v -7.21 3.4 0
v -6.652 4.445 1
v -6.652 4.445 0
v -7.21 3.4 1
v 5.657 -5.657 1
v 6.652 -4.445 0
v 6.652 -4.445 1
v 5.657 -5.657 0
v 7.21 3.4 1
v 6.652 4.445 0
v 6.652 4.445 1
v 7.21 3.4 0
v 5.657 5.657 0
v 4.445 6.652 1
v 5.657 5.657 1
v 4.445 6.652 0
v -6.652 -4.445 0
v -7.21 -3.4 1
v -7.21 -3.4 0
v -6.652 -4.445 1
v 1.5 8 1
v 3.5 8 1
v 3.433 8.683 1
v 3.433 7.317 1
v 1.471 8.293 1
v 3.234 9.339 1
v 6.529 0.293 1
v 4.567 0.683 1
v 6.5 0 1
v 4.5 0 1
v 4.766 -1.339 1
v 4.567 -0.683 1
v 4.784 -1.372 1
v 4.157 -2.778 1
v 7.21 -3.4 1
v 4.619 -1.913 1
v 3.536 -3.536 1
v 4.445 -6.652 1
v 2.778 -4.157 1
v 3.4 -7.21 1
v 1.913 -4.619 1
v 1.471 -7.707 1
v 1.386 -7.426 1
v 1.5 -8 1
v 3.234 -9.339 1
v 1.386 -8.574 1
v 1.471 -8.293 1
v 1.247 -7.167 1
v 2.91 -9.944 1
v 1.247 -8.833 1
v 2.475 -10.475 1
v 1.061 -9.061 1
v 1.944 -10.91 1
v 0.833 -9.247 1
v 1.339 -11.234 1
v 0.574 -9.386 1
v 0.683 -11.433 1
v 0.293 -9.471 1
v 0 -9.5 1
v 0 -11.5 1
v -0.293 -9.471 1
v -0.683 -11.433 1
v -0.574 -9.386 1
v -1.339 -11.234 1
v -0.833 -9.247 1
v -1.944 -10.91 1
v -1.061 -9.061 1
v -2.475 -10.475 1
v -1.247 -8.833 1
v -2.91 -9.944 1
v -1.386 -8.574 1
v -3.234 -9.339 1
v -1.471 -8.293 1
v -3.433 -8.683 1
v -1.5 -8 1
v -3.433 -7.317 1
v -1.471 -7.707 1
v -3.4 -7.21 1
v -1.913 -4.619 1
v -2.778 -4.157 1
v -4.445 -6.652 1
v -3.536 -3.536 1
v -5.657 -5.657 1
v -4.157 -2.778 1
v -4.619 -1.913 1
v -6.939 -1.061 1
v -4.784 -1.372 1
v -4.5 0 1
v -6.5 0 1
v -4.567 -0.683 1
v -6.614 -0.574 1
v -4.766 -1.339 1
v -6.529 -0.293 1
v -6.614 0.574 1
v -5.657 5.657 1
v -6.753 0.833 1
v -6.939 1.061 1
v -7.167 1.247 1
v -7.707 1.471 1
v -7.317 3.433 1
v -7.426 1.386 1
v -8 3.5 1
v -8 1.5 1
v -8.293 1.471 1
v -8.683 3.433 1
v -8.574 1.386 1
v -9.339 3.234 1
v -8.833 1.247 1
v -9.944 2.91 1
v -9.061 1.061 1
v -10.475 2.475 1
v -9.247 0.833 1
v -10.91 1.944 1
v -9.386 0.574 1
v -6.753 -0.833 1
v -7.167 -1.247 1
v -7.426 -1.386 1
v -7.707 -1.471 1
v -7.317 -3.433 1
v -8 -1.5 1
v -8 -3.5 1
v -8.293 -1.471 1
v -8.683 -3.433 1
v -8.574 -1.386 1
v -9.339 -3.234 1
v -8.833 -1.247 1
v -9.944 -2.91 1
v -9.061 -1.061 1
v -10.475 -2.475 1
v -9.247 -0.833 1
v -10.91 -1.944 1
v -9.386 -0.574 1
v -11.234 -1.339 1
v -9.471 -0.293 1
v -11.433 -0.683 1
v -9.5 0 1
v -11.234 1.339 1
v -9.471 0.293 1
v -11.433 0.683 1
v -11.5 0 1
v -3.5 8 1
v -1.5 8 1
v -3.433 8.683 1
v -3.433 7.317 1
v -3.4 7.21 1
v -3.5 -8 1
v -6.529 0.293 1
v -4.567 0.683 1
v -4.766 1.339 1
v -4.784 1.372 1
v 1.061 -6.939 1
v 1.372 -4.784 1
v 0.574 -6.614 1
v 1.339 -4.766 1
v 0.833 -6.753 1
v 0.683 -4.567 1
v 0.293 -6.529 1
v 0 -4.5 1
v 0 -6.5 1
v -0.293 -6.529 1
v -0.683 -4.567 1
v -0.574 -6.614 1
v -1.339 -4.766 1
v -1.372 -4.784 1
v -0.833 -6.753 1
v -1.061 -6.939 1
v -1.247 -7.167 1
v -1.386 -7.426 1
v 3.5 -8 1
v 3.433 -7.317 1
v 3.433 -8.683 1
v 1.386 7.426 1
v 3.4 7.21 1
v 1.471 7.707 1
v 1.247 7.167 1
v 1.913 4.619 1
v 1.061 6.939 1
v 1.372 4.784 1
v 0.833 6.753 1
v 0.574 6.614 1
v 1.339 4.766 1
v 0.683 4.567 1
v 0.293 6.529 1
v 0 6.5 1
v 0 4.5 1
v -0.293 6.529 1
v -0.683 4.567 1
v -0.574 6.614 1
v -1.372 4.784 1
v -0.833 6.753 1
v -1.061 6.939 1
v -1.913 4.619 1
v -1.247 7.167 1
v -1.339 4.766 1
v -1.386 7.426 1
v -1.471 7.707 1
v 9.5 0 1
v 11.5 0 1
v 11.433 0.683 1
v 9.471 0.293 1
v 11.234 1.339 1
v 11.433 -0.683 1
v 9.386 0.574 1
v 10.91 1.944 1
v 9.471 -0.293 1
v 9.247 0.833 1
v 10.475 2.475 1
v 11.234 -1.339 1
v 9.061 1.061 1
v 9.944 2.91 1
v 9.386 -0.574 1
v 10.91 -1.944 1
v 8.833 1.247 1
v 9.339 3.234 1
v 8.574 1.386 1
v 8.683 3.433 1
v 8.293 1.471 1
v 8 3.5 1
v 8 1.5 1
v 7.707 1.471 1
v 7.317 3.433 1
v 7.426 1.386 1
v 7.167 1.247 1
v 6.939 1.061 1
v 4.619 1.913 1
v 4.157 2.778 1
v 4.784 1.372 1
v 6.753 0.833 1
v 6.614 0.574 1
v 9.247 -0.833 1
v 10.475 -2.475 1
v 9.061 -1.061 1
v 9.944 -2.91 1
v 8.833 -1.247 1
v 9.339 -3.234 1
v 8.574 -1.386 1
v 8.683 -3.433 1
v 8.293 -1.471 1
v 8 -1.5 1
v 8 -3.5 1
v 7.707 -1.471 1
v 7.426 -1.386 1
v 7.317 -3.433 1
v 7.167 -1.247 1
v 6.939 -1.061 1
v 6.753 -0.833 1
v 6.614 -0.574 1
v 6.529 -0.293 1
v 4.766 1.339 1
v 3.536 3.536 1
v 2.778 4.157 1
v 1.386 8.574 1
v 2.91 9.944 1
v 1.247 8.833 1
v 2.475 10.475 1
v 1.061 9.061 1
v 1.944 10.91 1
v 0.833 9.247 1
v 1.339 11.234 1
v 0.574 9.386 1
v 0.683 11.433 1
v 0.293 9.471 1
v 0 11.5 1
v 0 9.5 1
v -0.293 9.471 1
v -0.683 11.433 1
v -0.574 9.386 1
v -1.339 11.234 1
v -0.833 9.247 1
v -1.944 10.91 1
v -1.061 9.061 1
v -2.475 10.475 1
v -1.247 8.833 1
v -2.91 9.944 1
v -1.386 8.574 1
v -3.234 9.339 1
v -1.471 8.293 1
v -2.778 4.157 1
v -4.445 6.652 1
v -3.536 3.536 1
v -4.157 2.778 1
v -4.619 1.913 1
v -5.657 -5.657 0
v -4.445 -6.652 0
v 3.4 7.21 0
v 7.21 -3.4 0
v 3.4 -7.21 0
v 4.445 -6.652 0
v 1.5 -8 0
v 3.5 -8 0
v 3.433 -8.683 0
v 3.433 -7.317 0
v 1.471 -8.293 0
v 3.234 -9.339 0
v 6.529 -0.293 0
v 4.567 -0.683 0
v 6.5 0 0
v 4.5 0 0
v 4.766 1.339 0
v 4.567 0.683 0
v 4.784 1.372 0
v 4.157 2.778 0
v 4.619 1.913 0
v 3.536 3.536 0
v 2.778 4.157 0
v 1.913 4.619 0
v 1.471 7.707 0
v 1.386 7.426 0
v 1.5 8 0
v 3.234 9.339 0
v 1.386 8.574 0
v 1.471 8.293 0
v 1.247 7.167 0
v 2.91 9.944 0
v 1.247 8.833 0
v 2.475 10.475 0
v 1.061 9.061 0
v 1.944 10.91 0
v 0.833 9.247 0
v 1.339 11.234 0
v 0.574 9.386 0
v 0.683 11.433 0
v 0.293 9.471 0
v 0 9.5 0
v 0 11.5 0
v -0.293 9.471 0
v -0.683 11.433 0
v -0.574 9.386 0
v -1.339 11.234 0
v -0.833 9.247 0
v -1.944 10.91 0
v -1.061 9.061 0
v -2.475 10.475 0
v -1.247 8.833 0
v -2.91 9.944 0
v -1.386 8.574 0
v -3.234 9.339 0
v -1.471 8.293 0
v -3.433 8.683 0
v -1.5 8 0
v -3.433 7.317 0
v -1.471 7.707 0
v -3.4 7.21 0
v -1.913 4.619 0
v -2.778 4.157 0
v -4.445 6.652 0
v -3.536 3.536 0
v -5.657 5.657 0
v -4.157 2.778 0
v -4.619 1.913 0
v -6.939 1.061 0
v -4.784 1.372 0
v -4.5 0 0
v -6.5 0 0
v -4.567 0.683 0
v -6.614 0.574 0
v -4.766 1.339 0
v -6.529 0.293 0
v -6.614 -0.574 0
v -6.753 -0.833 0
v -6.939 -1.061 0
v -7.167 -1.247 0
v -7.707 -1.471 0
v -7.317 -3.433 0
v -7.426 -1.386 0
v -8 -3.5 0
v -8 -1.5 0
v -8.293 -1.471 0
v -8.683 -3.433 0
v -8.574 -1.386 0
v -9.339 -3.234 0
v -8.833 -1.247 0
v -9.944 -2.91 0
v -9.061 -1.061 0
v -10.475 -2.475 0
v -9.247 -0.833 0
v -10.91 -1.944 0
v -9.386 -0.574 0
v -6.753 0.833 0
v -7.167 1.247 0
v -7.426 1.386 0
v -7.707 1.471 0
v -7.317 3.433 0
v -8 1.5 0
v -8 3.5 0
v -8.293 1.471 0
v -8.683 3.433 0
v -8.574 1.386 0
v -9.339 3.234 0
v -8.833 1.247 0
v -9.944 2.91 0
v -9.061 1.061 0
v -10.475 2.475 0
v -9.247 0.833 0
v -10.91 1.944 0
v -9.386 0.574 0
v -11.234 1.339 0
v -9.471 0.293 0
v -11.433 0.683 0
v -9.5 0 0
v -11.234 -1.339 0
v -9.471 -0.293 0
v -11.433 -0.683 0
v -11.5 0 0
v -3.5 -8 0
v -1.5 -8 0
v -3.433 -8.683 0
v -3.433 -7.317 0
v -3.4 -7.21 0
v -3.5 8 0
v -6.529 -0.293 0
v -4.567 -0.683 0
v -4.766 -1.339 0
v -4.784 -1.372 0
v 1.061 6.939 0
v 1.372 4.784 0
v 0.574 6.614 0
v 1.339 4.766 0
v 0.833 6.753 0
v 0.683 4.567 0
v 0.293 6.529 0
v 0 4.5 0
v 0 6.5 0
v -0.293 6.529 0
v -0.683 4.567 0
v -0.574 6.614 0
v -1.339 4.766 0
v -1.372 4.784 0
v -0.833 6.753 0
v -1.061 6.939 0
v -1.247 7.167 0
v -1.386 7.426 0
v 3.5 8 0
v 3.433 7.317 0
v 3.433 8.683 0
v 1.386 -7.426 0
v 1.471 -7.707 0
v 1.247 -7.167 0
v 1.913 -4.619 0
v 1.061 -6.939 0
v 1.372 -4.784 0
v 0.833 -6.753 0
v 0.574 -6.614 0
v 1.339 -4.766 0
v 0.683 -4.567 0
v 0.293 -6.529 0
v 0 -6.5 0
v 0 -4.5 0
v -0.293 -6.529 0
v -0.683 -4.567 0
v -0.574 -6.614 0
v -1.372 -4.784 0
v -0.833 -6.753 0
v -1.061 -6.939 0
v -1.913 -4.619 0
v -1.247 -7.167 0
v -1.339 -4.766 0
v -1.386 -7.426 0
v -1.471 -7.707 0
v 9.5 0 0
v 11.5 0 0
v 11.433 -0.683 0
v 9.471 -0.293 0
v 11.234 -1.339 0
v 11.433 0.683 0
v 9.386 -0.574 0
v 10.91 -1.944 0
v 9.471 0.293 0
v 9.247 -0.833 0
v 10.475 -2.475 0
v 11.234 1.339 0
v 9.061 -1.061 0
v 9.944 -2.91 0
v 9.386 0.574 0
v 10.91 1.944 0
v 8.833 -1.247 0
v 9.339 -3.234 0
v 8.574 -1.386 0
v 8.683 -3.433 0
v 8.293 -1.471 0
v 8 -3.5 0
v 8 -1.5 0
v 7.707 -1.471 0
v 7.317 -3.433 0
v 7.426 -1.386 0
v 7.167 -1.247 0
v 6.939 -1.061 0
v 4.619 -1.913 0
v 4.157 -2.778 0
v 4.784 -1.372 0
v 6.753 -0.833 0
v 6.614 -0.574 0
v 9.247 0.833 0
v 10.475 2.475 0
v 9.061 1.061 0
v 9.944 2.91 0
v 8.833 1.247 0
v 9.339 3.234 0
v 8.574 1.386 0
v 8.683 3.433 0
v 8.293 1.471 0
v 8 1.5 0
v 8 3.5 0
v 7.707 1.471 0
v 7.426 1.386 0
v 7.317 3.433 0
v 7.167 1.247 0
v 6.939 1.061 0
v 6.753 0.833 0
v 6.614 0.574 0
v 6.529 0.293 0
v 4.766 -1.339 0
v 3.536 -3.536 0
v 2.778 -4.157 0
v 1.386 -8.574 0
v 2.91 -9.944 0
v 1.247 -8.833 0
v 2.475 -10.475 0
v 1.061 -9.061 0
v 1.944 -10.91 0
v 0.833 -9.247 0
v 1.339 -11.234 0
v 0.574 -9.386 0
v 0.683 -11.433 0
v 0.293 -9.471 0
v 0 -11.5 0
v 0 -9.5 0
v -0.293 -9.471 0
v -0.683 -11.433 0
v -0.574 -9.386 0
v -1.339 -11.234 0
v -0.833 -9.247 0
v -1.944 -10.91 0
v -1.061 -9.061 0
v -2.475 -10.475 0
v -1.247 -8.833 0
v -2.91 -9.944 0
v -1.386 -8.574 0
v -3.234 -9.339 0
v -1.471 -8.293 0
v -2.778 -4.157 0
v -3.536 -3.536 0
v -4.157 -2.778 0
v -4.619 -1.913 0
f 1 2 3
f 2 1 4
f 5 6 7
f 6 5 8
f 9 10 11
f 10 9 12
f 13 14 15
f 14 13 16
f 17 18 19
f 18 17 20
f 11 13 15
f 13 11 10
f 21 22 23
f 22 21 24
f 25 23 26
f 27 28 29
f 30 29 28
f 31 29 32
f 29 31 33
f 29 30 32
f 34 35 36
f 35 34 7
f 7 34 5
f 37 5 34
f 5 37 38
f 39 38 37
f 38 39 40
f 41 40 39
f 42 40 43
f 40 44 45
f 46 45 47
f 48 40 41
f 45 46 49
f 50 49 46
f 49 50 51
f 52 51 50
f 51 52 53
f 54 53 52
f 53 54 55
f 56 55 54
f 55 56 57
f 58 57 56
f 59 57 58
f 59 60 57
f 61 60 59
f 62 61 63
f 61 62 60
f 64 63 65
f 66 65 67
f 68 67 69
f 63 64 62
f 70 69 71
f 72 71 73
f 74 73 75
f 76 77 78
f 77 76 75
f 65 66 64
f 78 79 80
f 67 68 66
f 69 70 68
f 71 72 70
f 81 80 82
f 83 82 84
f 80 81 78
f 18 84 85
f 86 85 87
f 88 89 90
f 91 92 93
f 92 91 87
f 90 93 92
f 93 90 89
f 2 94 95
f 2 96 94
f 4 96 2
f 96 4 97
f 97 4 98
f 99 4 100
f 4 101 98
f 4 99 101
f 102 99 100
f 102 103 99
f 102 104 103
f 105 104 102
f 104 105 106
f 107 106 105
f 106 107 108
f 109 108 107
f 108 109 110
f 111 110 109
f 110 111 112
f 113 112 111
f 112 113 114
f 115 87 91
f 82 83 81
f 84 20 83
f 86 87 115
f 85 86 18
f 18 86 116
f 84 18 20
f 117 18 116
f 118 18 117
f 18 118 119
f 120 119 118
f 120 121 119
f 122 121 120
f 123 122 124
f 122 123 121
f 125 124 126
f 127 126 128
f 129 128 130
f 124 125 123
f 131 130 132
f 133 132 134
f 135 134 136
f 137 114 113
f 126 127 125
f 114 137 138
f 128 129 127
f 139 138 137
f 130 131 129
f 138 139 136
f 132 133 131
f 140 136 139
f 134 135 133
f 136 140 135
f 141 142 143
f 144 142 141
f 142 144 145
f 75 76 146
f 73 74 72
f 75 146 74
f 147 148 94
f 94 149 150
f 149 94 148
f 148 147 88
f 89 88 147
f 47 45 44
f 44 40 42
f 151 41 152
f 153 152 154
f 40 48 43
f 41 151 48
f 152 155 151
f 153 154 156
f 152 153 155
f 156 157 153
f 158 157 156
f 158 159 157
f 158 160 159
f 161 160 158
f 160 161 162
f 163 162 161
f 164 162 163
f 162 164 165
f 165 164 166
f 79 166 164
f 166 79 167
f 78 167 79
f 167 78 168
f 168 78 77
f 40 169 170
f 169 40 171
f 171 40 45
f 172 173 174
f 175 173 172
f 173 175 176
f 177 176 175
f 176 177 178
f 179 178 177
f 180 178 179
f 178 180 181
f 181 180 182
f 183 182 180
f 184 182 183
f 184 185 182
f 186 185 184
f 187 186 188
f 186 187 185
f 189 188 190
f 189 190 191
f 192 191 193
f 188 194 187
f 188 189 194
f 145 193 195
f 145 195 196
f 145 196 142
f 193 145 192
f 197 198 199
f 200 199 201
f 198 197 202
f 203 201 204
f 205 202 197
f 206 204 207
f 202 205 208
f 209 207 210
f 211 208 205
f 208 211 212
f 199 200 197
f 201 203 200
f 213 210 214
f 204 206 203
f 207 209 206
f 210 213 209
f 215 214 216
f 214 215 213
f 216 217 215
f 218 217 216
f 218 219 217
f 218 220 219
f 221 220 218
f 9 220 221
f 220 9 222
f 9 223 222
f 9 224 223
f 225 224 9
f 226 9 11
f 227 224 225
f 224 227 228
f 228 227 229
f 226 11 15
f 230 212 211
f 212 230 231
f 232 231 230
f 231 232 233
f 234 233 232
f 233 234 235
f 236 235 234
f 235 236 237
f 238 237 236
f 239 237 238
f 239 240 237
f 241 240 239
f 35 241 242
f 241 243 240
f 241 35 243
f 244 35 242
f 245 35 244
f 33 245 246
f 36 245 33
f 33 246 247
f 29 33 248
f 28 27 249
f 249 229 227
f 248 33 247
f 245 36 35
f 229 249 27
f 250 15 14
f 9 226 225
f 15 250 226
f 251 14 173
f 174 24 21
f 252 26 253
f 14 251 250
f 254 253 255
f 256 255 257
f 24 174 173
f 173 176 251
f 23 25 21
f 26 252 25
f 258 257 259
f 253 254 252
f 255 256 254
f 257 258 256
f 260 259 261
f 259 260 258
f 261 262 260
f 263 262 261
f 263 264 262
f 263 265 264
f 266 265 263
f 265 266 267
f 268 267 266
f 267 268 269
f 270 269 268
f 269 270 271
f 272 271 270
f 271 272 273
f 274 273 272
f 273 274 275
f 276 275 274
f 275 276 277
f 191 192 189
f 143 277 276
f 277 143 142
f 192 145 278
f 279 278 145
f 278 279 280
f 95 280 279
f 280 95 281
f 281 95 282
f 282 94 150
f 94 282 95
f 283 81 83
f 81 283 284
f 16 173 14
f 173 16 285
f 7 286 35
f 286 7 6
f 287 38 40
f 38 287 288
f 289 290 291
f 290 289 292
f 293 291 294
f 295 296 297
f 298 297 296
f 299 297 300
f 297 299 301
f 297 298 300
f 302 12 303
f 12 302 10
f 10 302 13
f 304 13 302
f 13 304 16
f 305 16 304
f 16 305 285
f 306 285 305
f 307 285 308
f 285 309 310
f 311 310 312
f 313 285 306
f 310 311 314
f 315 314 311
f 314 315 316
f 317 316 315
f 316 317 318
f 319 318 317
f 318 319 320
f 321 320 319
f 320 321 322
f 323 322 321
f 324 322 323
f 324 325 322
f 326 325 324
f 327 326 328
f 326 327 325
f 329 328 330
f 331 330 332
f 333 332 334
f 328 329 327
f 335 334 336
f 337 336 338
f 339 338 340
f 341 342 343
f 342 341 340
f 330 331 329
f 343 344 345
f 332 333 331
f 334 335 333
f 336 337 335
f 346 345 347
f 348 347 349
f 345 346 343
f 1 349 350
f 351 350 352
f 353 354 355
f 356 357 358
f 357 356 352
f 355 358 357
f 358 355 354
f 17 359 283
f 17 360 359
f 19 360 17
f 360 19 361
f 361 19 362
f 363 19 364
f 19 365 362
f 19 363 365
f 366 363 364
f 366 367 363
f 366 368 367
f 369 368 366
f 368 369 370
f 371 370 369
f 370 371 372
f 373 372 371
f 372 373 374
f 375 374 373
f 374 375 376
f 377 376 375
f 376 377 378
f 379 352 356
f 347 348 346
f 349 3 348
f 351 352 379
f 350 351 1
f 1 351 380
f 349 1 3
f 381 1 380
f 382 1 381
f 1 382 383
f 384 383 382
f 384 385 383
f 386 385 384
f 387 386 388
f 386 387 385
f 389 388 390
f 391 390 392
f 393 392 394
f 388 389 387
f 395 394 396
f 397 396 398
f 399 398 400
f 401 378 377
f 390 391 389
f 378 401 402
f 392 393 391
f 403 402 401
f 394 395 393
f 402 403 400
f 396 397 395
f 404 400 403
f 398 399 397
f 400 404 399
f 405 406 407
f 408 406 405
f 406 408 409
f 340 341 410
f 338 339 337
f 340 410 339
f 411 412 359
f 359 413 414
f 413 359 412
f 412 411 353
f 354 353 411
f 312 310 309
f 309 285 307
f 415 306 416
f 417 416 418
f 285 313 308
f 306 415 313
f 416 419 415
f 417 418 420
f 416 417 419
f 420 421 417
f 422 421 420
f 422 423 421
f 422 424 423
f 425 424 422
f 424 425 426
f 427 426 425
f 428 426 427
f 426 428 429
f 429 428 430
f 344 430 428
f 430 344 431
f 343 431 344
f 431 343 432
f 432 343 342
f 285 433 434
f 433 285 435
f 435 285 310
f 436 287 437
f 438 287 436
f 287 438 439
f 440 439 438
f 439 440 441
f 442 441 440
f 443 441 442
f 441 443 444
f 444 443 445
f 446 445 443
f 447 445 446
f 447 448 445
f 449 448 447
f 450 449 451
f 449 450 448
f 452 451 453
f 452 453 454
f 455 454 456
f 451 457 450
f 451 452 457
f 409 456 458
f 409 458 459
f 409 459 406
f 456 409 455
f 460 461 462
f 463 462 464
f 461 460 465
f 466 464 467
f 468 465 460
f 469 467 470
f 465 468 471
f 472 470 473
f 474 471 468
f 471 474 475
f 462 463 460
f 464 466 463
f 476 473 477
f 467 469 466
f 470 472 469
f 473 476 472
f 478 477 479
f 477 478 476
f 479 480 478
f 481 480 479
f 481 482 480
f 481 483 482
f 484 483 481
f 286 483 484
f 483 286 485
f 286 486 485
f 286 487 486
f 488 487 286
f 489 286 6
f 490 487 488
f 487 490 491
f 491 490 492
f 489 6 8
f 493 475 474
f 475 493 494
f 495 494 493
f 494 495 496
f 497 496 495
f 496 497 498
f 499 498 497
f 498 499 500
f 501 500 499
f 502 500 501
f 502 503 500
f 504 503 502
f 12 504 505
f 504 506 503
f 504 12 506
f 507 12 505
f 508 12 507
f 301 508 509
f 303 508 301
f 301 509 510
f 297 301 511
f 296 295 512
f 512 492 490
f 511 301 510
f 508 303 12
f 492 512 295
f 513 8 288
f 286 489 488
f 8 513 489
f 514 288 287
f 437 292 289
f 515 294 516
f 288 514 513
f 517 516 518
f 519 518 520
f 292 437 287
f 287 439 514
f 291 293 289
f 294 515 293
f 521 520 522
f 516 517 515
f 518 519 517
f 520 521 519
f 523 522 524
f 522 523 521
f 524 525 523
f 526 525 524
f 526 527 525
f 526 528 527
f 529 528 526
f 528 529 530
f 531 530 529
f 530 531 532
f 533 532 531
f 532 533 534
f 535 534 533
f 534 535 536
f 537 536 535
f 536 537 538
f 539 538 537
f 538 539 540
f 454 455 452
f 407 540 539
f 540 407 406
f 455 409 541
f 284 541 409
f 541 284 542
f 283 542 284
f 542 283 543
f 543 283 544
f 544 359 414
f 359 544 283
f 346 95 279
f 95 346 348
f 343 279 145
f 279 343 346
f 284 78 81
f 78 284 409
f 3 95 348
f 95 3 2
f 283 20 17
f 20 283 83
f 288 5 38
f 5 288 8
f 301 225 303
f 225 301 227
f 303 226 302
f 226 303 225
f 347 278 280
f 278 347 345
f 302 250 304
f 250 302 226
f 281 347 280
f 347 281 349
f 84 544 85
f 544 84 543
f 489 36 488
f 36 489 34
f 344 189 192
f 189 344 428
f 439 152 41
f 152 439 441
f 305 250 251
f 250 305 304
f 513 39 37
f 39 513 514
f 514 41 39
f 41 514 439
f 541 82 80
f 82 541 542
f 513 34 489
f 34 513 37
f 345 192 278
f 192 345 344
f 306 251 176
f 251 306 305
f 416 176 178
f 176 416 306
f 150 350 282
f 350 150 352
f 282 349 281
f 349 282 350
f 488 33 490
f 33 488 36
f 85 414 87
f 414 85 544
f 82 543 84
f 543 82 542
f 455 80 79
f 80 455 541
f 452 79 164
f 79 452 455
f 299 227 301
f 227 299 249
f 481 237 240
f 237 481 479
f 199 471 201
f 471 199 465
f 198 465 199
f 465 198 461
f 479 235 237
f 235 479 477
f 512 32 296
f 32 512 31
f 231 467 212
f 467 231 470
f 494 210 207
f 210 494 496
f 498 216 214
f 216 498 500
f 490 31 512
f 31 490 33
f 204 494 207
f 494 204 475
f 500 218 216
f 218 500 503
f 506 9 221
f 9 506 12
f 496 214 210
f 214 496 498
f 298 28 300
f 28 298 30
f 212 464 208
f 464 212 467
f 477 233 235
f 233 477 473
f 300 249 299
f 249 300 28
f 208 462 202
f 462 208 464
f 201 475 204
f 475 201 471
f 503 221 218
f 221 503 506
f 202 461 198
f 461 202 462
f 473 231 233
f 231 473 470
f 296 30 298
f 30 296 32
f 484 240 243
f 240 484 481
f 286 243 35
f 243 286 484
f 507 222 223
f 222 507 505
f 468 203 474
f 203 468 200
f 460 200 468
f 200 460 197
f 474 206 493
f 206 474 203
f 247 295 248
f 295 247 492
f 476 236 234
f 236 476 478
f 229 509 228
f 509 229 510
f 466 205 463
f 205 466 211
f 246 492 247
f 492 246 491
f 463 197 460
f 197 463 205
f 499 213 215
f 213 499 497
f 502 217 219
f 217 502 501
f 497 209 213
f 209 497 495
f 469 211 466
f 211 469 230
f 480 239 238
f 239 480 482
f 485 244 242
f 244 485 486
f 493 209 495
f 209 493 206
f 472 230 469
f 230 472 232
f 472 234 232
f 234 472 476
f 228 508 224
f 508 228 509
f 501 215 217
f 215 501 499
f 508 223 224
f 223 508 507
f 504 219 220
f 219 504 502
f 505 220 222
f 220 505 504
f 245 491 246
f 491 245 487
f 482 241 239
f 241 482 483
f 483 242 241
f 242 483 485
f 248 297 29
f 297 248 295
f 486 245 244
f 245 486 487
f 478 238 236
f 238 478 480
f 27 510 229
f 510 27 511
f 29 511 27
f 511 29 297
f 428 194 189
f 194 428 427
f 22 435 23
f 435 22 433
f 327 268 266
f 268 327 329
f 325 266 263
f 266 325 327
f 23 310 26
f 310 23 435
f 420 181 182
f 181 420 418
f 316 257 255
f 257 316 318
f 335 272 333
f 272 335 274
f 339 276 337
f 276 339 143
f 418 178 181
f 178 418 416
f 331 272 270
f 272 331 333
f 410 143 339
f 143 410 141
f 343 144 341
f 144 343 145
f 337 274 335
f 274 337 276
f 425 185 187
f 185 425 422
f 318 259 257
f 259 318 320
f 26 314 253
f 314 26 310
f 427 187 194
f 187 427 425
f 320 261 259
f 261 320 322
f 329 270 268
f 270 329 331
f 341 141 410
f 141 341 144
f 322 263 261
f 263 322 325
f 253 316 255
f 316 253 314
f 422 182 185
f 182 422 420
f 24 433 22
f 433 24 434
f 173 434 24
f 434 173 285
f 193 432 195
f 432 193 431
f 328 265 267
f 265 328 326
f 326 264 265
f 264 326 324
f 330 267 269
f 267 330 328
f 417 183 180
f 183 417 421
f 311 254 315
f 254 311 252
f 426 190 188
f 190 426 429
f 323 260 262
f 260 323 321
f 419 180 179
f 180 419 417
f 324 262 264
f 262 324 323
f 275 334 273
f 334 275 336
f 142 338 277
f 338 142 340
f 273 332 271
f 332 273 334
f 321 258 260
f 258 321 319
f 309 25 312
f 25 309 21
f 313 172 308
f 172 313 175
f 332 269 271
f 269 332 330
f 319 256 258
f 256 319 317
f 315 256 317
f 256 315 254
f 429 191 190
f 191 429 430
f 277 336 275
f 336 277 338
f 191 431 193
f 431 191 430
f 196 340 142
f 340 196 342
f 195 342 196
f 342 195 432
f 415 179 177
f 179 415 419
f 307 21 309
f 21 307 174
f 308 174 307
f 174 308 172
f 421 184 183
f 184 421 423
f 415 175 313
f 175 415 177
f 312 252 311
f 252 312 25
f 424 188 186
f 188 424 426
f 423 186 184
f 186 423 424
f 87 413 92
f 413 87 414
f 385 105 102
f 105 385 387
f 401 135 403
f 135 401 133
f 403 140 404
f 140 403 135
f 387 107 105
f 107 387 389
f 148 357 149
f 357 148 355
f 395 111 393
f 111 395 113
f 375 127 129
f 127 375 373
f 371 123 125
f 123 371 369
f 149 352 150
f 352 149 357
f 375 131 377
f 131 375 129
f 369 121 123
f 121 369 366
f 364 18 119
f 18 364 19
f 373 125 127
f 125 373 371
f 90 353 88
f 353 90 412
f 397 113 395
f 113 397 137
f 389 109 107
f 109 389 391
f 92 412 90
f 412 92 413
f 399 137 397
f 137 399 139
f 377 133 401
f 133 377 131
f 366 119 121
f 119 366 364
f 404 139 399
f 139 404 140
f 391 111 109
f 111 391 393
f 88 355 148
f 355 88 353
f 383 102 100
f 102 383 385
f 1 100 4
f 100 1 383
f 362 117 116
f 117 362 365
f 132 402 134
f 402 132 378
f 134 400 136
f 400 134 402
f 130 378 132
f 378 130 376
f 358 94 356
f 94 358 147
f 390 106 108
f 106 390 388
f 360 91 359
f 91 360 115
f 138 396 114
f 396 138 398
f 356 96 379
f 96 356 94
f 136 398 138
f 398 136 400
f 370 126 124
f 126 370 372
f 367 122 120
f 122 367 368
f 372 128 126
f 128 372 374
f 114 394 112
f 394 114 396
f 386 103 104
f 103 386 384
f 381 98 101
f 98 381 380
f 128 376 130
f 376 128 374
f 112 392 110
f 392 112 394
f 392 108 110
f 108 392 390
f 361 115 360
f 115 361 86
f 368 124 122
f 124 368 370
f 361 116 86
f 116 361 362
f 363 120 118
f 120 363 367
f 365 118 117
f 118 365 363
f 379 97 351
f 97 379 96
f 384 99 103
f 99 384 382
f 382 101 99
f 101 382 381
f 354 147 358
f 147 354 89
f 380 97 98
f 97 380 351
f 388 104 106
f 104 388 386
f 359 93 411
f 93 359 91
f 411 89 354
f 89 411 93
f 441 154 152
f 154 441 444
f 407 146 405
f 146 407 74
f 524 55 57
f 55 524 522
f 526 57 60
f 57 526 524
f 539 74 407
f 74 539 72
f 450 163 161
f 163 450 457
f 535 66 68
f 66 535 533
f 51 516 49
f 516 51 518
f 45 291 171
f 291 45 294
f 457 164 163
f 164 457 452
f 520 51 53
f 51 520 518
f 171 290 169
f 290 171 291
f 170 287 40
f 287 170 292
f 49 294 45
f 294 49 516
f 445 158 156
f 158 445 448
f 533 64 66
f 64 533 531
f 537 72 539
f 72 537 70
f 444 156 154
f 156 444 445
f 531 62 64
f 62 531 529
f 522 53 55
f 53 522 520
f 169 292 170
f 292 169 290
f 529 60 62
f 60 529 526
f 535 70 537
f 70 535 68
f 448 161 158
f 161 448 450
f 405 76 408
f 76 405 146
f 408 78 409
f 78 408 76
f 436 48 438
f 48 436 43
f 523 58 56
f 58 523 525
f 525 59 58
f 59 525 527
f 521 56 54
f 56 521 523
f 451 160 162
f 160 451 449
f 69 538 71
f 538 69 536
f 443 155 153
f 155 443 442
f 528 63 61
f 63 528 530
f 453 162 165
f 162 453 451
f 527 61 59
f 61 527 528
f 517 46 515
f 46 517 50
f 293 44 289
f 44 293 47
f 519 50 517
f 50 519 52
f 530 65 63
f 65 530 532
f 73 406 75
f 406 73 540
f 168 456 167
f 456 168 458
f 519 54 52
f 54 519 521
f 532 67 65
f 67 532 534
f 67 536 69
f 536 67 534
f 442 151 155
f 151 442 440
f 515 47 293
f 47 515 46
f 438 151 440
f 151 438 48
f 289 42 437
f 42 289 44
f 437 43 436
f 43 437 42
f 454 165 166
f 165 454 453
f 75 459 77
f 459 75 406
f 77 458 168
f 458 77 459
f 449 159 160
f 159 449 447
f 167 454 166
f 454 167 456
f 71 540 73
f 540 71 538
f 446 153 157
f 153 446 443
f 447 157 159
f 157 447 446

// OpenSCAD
// Height of the main plate
plate_thickness = 1.0;


// Motor screw hole diameter
motor_mount_screw_diameter = 1.5;

// Thickness of material around each motor screw hole
motor_mount_screw_padding = 2.0;

// Distance of motor screw holes from center
motor_mount_screw_dist_from_center = 8.0;

// Number of motor screw holes
num_screw_holes = 4;

angle_step = (360/num_screw_holes);

motor_mount_middle_hole_diameter = 5.0;










module ScrewHole()
{
  difference(){
    cylinder(r=motor_mount_screw_diameter+motor_mount_screw_padding,h=plate_thickness,$fn=32, center = true);
    cylinder(r=motor_mount_screw_diameter,h=plate_thickness*2,$fn=32, center = true);
  }       
}


module MiddleHole()
{
  difference(){  
    difference(){
      cylinder(r=motor_mount_screw_dist_from_center,h=plate_thickness,$fn=32, center = true);
      cylinder(r=motor_mount_middle_hole_diameter,h=plate_thickness*2,$fn=32, center = true);
    }
        
    for (i=[0:num_screw_holes])
    {
      rotate([0, 0, i * angle_step])
      translate([10,0,0])
      cylinder(r=motor_mount_screw_diameter+motor_mount_screw_padding,h=plate_thickness*2,$fn=32, center = true);
    }

  }    
}


module MotorSoftMount()
{
  translate([0,0,plate_thickness/2])
  {  
    MiddleHole();
    
    for (i=[0:num_screw_holes])
    {
      
     rotate([0, 0, i * angle_step])
      
     translate([motor_mount_screw_dist_from_center,0,0])
     ScrewHole();
     
    }
  }
}

difference(){
  MotorSoftMount();
}
